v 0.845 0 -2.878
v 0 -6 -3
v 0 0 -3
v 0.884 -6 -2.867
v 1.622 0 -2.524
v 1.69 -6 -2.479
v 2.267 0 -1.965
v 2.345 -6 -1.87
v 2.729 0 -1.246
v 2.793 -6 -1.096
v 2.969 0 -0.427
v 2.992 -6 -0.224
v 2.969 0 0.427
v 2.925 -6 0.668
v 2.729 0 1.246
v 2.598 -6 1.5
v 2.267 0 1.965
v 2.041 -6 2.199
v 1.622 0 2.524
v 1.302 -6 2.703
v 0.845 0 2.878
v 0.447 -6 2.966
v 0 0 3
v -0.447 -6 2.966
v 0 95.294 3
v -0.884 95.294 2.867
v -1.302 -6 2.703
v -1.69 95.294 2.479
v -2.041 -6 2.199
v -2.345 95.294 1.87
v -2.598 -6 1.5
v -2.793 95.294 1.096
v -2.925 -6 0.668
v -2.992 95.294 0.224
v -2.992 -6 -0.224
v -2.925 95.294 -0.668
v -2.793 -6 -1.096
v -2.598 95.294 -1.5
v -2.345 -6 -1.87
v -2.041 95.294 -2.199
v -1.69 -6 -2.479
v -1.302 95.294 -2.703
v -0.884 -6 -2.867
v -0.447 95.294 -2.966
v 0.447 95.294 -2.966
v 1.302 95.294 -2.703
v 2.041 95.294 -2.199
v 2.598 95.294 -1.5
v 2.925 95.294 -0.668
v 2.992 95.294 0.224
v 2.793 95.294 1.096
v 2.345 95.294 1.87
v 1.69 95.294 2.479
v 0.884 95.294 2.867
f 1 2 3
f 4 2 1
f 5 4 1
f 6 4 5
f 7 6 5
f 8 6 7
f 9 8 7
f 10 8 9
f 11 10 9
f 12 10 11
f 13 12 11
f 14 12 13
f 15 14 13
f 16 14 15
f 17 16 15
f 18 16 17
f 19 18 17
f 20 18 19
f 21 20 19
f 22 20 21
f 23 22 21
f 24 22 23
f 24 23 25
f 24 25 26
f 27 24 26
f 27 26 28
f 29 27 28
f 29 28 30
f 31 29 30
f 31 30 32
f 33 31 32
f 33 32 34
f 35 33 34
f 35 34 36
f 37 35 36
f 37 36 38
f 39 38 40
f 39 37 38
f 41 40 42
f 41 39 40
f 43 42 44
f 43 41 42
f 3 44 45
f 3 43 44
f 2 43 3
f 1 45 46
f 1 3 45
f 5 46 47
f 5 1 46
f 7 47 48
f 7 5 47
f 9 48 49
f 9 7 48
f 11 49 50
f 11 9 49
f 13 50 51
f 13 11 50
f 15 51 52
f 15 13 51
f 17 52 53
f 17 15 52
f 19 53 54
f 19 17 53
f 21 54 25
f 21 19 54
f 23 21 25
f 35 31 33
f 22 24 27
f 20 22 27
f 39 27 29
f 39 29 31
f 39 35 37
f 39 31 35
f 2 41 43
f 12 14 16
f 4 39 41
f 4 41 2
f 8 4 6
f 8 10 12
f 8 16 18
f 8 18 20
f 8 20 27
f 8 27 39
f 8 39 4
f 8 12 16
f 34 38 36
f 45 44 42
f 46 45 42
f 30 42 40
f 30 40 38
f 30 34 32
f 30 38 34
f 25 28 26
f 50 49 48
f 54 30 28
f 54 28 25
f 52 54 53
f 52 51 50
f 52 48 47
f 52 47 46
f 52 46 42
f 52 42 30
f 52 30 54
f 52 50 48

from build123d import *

# Parameters (mm, degrees)
SKETCH1_R           = 3
BOSS_EXTRUDE1_DEPTH = 54
SKETCH2_R           = 3
BOSS_EXTRUDE2_DEPTH = 35.293714059
SKETCH3_R           = 3
BOSS_EXTRUDE3_DEPTH = 6
BOSS_EXTRUDE4_START = 6
SKETCH4_R           = 3
BOSS_EXTRUDE4_DEPTH = 6


with BuildPart() as part:
    # Sketch1 → Boss-Extrude1 (new body)
    with BuildSketch(Plane(origin=(0, 0, 0), x_dir=(1, 0, 0), z_dir=(0, 1, 0))):
        with Locations(Location((0, 0, 0), (0, 0, 270))):
            Circle(SKETCH1_R)
    extrude(amount=BOSS_EXTRUDE1_DEPTH)

    # Sketch2 → Boss-Extrude2 (add)
    with BuildSketch(Plane(origin=(0, 54, 0), x_dir=(1, 0, 0), z_dir=(0, 1, 0))):
        with Locations(Location((0, 0, 0), (0, 0, 270))):
            Circle(SKETCH2_R)
    extrude(amount=BOSS_EXTRUDE2_DEPTH)

    # Sketch3 → Boss-Extrude3 (add)
    with BuildSketch(Plane(origin=(0, 89.293714059, 0), x_dir=(1, 0, 0), z_dir=(0, 1, 0))):
        with Locations(Location((0, 0, 0), (0, 0, 270))):
            Circle(SKETCH3_R)
    extrude(amount=BOSS_EXTRUDE3_DEPTH)

    # Sketch4 → Boss-Extrude4 (add)
    with BuildSketch(Plane.XZ.offset(BOSS_EXTRUDE4_START)):
        with Locations(Location((0, 0, 0), (0, 0, 270))):
            Circle(SKETCH4_R)
    extrude(amount=-BOSS_EXTRUDE4_DEPTH)


solid = part.part
